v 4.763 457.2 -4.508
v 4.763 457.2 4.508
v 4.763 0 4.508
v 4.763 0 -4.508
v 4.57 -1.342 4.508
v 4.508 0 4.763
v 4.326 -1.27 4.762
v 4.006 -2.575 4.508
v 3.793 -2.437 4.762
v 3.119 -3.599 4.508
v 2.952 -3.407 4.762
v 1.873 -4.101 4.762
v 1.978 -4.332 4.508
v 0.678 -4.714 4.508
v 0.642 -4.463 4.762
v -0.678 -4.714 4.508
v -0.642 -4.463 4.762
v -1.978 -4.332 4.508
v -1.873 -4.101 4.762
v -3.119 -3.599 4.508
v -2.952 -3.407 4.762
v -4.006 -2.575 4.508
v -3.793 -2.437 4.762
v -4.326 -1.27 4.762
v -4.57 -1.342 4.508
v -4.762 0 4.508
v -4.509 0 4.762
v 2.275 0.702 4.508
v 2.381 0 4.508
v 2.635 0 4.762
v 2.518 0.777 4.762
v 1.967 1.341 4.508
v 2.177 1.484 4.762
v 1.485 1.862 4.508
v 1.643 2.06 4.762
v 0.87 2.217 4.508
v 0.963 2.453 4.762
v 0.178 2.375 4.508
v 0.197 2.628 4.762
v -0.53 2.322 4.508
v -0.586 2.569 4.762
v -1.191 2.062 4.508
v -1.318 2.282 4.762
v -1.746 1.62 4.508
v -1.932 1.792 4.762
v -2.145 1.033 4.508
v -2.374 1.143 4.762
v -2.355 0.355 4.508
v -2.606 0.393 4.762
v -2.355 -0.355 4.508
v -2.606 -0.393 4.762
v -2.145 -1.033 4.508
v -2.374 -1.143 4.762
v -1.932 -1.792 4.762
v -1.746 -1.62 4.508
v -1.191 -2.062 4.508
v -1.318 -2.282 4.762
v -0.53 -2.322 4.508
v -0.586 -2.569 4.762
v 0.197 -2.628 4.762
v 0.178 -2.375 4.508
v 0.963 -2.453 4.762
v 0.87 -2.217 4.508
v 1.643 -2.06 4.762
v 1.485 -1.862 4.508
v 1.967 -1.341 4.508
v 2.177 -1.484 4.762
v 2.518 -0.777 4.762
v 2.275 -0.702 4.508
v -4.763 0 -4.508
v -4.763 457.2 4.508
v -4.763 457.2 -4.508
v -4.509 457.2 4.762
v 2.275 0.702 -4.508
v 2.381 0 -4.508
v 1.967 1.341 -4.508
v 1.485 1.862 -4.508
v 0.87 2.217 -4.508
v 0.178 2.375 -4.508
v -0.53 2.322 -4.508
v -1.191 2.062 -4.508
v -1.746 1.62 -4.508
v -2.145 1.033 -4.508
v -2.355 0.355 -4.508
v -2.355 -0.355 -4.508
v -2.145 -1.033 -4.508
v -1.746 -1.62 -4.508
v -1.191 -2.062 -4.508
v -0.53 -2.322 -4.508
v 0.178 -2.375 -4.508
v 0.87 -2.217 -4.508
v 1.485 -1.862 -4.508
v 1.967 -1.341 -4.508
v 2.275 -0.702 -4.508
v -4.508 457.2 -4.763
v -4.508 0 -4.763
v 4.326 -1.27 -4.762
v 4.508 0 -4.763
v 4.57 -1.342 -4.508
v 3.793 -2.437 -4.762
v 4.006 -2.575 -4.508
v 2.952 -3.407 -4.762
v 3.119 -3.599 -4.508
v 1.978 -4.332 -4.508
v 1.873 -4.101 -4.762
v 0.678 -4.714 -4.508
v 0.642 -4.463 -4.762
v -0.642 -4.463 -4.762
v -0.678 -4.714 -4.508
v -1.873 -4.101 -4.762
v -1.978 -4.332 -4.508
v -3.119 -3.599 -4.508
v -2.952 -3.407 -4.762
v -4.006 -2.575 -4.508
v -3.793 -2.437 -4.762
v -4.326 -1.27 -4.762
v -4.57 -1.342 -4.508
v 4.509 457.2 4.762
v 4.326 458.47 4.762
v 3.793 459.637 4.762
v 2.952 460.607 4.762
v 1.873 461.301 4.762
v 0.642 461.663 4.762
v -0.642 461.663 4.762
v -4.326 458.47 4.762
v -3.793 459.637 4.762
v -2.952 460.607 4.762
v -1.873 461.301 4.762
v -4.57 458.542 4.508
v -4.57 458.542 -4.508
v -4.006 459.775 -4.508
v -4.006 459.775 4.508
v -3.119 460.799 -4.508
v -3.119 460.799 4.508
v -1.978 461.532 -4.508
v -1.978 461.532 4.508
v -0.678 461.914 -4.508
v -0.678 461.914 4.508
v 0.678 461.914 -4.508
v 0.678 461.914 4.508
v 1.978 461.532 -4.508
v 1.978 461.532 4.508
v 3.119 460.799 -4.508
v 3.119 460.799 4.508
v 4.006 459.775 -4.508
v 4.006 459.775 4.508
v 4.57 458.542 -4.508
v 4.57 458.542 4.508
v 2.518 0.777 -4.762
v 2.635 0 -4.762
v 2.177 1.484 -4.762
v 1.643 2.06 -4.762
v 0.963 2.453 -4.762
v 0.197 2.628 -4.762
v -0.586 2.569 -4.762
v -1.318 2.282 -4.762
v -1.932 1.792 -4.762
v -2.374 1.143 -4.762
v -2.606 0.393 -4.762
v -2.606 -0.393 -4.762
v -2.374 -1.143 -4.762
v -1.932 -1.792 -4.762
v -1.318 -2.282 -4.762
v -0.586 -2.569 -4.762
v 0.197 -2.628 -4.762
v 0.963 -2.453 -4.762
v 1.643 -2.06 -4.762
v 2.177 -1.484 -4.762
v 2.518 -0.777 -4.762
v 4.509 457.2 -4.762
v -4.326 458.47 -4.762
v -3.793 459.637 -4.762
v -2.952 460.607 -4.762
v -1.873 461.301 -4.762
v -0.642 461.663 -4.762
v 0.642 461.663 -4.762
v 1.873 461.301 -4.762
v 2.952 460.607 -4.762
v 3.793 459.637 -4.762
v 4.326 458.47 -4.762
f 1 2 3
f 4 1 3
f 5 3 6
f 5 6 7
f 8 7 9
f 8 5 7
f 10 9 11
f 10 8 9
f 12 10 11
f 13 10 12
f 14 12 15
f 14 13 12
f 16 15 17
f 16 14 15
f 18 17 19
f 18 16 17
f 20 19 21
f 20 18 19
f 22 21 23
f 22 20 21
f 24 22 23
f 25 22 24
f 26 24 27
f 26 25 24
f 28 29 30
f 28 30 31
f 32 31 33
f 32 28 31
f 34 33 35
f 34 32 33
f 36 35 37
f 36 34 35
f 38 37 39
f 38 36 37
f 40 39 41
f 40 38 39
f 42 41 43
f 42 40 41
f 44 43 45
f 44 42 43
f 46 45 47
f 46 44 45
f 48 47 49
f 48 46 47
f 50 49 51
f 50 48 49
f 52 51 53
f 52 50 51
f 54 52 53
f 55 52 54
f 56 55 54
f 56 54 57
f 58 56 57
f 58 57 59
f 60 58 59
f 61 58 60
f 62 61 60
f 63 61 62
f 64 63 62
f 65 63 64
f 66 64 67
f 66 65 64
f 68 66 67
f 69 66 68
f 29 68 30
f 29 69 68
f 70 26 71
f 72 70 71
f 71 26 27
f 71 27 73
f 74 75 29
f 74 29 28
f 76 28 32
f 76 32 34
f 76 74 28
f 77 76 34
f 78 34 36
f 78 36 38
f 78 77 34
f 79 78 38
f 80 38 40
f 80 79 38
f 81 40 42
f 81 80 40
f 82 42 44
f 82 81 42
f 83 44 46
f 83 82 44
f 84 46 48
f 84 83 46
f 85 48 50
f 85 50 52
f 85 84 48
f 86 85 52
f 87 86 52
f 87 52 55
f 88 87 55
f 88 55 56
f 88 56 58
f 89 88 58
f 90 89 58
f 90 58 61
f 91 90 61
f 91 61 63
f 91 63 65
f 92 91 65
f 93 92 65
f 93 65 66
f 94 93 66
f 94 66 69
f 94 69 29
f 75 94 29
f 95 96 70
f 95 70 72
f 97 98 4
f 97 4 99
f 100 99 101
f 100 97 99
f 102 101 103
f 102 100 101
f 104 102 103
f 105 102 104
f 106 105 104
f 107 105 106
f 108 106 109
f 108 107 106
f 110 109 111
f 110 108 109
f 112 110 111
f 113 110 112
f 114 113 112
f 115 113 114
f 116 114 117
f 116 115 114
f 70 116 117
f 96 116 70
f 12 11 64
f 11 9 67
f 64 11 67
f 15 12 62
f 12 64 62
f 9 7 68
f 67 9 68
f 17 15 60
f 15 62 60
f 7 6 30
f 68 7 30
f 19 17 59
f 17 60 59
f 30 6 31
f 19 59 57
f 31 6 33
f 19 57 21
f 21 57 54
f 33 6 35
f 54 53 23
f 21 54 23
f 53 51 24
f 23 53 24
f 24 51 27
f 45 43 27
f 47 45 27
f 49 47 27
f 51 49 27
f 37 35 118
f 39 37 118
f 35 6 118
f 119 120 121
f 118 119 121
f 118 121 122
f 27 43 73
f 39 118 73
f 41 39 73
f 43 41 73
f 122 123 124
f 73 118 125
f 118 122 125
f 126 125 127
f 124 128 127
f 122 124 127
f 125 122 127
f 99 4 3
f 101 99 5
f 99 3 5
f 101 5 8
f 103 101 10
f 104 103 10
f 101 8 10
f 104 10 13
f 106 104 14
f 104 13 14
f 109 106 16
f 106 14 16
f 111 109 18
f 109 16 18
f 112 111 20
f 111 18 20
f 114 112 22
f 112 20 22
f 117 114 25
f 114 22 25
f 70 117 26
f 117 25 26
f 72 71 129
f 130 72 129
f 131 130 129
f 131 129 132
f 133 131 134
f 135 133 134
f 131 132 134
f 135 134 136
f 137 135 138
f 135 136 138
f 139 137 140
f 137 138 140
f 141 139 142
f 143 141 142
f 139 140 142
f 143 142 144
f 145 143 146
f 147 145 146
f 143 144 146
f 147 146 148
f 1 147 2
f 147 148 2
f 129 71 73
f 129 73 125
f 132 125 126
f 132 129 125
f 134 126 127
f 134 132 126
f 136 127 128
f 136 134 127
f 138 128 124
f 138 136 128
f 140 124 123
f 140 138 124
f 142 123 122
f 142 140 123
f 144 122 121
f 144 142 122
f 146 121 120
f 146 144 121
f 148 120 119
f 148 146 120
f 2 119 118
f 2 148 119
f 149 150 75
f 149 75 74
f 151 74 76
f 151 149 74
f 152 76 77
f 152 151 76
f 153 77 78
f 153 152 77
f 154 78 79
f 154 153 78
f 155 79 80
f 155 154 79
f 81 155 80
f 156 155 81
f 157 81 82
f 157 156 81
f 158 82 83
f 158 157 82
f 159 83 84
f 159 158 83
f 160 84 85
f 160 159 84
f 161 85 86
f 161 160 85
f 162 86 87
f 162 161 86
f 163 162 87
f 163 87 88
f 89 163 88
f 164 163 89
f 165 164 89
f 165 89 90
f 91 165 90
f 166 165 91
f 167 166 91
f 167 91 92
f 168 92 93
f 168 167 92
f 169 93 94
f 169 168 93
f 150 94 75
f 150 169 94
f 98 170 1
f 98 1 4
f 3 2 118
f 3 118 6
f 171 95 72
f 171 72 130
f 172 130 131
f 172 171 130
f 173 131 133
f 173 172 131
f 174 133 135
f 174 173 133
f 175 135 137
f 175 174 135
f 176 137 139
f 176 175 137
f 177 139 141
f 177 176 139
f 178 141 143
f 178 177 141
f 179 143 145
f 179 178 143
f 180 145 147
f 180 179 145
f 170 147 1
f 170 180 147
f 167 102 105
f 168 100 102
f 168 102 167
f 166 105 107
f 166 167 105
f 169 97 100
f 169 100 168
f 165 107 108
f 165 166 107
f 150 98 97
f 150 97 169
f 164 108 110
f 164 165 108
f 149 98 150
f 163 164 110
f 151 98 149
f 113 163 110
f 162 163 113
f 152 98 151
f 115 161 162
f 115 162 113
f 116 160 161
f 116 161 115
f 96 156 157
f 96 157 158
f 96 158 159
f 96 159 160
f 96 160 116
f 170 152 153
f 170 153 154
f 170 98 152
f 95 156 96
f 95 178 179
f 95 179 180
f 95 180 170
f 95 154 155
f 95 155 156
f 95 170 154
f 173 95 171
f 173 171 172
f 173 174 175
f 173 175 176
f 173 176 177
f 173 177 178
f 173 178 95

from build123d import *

# Parameters (mm, degrees)
SKETCH1_R           = 2.38125
BOSS_EXTRUDE1_DEPTH = 4.7625
CHAMFER1_SIZE       = 0.254


with BuildPart() as part:
    # Sketch1 → Boss-Extrude1 (new body, symmetric)
    with BuildSketch(Plane.XY):
        with BuildLine():
            Line((-4.7625, 0), (-4.7625, 457.2))
            ThreePointArc((-4.7625, 457.2), (0, 461.9625), (4.7625, 457.2))
            Line((4.7625, 457.2), (4.7625, 0))
            ThreePointArc((4.7625, 0), (0, -4.7625), (-4.7625, 0))
        make_face()
        Circle(SKETCH1_R, mode=Mode.SUBTRACT)
    extrude(amount=BOSS_EXTRUDE1_DEPTH, both=True)

    # Chamfer1
    chamfer1_edges = [part.edges().sort_by_distance(p)[0] for p in [
        (-2.38125, 0, -4.7625),
        (-2.38125, 0, 4.7625),
        (0, 461.9625, 4.7625),
        (-4.7625, 228.6, 4.7625),
        (0, -4.7625, 4.7625),
        (-4.7625, 228.6, -4.7625),
        (0, 461.9625, -4.7625),
        (4.7625, 228.6, -4.7625),
        (0, -4.7625, -4.7625),
        (4.7625, 228.6, 4.7625),
    ]]
    chamfer(chamfer1_edges, length=CHAMFER1_SIZE)


solid = part.part
